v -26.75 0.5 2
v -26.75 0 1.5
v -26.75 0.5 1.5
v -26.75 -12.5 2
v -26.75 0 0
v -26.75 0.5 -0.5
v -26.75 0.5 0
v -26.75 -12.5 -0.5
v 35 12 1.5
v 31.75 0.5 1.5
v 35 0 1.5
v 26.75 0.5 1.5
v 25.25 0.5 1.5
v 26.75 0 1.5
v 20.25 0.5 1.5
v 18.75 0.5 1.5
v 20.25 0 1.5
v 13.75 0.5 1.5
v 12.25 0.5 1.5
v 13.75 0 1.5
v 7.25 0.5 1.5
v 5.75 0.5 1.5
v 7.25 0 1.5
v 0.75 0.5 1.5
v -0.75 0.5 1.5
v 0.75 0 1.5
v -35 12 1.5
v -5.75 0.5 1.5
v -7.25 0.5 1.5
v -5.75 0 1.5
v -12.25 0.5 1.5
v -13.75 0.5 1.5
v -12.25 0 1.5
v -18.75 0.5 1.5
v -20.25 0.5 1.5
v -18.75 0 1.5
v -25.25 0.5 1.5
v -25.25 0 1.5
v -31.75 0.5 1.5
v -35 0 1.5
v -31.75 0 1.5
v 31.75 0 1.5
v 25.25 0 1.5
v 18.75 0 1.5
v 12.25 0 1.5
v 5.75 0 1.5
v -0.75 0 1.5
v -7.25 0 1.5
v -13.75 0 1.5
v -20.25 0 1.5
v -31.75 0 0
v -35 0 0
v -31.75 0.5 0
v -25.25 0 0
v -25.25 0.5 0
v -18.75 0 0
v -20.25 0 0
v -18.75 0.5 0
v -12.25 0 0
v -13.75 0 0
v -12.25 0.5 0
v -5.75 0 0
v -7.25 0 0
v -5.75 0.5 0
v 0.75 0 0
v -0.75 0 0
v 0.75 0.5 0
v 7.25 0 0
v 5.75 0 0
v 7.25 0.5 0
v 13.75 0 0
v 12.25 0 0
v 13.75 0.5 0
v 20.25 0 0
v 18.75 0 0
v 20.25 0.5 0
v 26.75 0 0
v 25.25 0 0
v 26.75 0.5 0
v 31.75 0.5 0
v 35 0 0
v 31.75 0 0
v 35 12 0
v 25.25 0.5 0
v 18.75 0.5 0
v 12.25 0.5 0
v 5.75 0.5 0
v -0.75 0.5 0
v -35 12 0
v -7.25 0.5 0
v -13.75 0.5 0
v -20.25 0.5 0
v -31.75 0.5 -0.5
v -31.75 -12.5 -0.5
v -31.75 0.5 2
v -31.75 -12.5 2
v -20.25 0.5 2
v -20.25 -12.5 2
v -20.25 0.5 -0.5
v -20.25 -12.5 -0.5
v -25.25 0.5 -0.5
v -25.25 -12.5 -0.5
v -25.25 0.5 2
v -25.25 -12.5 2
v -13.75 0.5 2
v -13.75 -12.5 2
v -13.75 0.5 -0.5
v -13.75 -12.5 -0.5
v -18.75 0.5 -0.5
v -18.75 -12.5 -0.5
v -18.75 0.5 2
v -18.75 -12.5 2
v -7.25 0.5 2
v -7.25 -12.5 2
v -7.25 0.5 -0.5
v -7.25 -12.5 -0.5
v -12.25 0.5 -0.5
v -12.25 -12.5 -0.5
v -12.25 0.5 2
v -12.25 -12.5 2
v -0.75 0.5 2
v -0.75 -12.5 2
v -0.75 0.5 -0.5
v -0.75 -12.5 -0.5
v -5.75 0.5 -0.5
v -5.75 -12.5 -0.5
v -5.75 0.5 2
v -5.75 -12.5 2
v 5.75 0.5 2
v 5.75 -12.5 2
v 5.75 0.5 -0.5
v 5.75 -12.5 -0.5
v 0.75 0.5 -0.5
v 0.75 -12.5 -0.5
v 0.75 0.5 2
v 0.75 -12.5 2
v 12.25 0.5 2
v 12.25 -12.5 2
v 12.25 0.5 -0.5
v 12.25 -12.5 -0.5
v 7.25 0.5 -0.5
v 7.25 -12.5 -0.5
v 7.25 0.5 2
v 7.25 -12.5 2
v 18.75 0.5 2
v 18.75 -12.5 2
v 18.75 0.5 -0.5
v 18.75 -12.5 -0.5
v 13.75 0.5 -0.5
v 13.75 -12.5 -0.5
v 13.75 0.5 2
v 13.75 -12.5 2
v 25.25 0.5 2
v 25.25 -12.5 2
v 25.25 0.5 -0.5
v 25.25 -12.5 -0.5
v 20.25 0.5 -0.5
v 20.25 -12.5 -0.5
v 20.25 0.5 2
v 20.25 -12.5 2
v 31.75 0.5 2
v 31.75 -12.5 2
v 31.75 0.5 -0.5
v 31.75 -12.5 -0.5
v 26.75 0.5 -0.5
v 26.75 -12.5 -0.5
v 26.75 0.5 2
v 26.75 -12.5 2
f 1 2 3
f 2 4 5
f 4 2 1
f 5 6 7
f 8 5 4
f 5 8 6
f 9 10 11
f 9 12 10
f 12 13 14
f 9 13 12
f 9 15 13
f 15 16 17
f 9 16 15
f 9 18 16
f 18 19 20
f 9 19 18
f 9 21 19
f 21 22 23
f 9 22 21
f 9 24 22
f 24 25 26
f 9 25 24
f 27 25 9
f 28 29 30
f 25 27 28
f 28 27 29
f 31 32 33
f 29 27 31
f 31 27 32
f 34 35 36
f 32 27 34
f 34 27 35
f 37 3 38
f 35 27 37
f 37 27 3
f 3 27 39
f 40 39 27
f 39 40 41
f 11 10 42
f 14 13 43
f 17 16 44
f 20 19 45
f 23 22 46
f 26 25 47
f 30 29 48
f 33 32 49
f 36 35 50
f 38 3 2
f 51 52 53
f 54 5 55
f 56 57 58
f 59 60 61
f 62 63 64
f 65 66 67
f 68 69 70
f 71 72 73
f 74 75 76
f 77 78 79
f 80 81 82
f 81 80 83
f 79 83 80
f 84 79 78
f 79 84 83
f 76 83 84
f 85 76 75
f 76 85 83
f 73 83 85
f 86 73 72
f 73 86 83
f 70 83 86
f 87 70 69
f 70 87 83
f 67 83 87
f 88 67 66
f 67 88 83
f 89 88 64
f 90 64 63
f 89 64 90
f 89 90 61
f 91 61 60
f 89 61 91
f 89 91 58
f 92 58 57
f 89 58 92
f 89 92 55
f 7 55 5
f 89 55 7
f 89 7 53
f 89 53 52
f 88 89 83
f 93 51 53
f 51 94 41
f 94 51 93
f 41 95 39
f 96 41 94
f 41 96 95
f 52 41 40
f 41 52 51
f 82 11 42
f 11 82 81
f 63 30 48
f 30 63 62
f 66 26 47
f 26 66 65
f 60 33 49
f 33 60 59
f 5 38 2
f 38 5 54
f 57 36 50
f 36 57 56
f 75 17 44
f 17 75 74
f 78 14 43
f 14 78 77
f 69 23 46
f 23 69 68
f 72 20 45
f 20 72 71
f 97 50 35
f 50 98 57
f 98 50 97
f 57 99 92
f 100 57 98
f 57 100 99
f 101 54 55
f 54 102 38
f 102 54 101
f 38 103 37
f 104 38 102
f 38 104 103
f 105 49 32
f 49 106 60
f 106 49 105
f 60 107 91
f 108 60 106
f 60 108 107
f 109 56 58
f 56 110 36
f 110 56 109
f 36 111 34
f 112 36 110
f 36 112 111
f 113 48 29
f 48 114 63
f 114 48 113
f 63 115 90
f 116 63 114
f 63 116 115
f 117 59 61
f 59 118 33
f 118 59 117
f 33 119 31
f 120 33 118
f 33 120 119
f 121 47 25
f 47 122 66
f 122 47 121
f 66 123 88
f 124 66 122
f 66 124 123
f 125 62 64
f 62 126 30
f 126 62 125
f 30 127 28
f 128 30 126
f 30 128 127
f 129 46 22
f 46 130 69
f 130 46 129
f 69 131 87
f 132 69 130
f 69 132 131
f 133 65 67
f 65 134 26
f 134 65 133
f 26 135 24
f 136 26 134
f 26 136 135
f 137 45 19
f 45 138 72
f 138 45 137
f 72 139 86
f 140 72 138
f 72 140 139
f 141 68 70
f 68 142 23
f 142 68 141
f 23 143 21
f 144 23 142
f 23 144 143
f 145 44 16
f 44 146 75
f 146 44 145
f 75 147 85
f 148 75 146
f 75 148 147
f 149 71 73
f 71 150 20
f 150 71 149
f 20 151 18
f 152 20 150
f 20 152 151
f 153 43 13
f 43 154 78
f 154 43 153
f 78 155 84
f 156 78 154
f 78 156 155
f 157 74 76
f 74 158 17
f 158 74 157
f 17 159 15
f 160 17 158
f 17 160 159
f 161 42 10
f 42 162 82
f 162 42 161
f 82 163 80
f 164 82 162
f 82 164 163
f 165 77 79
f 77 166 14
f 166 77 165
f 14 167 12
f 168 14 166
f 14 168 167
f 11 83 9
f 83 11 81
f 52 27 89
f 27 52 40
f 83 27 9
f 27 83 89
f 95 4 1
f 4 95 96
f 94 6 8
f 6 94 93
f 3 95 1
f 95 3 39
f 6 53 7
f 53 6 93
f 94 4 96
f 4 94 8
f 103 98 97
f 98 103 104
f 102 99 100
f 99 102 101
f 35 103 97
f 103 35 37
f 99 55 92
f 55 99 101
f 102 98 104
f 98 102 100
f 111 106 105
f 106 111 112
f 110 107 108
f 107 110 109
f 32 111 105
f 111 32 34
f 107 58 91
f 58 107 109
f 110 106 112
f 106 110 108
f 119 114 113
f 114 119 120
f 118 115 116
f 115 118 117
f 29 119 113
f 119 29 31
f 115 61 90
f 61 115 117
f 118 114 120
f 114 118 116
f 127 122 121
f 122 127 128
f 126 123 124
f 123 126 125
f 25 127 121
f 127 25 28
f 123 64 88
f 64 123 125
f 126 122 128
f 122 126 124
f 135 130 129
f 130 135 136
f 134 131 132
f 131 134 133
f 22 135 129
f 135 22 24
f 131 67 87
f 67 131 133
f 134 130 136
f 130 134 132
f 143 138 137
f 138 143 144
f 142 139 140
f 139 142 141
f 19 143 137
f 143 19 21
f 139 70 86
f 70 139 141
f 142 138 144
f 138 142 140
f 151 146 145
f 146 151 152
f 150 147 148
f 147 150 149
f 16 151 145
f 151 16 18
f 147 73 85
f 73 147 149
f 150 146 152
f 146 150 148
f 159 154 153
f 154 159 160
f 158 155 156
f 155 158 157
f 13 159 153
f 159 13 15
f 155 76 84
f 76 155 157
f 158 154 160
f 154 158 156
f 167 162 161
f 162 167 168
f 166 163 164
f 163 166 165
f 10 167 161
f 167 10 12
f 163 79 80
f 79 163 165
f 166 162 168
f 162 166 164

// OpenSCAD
// 10-well comb for casting agarose gels
// Print orientation: flat on bed, spine (back bar) along +X, teeth hanging in -Y

// ---------- Parameters ----------
spine_len   = 70;    // spine length along X (mm)
spine_wid   = 12;    // spine width along Y (mm)
plate_thk   = 1.5;   // comb plate thickness along Z (mm)

tooth_count = 10;    // number of teeth
tooth_w     = 5.0;   // tooth width along X (mm)
tooth_l     = 12;    // tooth length along Y (mm)
tooth_gap   = 1.5;   // gap between neighbouring teeth (mm)

eps         = 0.5;   // cutter overshoot past faces (mm)

$fn = 64;

// ---------- Derived ----------
pitch   = tooth_w + tooth_gap;              // centre-to-centre spacing
x_start = -(tooth_count - 1) * pitch / 2;   // first tooth centre (row centred on spine)

// ---------- Model ----------
union() {
    // Spine (back bar)
    translate([-spine_len / 2, 0, 0])
        cube([spine_len, spine_wid, plate_thk]);

    // Teeth
    for (i = [0 : tooth_count - 1])
        translate([x_start + i * pitch - tooth_w / 2, -tooth_l, 0])
            cube([tooth_w, tooth_l, plate_thk]);
}

// ---------- Cut the wells ----------
difference() {
    // Cut directly through the plate thickness.
    for (i = [0 : tooth_count - 1])
        translate([x_start + i * pitch - tooth_w / 2, -tooth_l - eps, -eps])
            cube([tooth_w, tooth_l + 2 * eps, plate_thk + 2 * eps]);
}
